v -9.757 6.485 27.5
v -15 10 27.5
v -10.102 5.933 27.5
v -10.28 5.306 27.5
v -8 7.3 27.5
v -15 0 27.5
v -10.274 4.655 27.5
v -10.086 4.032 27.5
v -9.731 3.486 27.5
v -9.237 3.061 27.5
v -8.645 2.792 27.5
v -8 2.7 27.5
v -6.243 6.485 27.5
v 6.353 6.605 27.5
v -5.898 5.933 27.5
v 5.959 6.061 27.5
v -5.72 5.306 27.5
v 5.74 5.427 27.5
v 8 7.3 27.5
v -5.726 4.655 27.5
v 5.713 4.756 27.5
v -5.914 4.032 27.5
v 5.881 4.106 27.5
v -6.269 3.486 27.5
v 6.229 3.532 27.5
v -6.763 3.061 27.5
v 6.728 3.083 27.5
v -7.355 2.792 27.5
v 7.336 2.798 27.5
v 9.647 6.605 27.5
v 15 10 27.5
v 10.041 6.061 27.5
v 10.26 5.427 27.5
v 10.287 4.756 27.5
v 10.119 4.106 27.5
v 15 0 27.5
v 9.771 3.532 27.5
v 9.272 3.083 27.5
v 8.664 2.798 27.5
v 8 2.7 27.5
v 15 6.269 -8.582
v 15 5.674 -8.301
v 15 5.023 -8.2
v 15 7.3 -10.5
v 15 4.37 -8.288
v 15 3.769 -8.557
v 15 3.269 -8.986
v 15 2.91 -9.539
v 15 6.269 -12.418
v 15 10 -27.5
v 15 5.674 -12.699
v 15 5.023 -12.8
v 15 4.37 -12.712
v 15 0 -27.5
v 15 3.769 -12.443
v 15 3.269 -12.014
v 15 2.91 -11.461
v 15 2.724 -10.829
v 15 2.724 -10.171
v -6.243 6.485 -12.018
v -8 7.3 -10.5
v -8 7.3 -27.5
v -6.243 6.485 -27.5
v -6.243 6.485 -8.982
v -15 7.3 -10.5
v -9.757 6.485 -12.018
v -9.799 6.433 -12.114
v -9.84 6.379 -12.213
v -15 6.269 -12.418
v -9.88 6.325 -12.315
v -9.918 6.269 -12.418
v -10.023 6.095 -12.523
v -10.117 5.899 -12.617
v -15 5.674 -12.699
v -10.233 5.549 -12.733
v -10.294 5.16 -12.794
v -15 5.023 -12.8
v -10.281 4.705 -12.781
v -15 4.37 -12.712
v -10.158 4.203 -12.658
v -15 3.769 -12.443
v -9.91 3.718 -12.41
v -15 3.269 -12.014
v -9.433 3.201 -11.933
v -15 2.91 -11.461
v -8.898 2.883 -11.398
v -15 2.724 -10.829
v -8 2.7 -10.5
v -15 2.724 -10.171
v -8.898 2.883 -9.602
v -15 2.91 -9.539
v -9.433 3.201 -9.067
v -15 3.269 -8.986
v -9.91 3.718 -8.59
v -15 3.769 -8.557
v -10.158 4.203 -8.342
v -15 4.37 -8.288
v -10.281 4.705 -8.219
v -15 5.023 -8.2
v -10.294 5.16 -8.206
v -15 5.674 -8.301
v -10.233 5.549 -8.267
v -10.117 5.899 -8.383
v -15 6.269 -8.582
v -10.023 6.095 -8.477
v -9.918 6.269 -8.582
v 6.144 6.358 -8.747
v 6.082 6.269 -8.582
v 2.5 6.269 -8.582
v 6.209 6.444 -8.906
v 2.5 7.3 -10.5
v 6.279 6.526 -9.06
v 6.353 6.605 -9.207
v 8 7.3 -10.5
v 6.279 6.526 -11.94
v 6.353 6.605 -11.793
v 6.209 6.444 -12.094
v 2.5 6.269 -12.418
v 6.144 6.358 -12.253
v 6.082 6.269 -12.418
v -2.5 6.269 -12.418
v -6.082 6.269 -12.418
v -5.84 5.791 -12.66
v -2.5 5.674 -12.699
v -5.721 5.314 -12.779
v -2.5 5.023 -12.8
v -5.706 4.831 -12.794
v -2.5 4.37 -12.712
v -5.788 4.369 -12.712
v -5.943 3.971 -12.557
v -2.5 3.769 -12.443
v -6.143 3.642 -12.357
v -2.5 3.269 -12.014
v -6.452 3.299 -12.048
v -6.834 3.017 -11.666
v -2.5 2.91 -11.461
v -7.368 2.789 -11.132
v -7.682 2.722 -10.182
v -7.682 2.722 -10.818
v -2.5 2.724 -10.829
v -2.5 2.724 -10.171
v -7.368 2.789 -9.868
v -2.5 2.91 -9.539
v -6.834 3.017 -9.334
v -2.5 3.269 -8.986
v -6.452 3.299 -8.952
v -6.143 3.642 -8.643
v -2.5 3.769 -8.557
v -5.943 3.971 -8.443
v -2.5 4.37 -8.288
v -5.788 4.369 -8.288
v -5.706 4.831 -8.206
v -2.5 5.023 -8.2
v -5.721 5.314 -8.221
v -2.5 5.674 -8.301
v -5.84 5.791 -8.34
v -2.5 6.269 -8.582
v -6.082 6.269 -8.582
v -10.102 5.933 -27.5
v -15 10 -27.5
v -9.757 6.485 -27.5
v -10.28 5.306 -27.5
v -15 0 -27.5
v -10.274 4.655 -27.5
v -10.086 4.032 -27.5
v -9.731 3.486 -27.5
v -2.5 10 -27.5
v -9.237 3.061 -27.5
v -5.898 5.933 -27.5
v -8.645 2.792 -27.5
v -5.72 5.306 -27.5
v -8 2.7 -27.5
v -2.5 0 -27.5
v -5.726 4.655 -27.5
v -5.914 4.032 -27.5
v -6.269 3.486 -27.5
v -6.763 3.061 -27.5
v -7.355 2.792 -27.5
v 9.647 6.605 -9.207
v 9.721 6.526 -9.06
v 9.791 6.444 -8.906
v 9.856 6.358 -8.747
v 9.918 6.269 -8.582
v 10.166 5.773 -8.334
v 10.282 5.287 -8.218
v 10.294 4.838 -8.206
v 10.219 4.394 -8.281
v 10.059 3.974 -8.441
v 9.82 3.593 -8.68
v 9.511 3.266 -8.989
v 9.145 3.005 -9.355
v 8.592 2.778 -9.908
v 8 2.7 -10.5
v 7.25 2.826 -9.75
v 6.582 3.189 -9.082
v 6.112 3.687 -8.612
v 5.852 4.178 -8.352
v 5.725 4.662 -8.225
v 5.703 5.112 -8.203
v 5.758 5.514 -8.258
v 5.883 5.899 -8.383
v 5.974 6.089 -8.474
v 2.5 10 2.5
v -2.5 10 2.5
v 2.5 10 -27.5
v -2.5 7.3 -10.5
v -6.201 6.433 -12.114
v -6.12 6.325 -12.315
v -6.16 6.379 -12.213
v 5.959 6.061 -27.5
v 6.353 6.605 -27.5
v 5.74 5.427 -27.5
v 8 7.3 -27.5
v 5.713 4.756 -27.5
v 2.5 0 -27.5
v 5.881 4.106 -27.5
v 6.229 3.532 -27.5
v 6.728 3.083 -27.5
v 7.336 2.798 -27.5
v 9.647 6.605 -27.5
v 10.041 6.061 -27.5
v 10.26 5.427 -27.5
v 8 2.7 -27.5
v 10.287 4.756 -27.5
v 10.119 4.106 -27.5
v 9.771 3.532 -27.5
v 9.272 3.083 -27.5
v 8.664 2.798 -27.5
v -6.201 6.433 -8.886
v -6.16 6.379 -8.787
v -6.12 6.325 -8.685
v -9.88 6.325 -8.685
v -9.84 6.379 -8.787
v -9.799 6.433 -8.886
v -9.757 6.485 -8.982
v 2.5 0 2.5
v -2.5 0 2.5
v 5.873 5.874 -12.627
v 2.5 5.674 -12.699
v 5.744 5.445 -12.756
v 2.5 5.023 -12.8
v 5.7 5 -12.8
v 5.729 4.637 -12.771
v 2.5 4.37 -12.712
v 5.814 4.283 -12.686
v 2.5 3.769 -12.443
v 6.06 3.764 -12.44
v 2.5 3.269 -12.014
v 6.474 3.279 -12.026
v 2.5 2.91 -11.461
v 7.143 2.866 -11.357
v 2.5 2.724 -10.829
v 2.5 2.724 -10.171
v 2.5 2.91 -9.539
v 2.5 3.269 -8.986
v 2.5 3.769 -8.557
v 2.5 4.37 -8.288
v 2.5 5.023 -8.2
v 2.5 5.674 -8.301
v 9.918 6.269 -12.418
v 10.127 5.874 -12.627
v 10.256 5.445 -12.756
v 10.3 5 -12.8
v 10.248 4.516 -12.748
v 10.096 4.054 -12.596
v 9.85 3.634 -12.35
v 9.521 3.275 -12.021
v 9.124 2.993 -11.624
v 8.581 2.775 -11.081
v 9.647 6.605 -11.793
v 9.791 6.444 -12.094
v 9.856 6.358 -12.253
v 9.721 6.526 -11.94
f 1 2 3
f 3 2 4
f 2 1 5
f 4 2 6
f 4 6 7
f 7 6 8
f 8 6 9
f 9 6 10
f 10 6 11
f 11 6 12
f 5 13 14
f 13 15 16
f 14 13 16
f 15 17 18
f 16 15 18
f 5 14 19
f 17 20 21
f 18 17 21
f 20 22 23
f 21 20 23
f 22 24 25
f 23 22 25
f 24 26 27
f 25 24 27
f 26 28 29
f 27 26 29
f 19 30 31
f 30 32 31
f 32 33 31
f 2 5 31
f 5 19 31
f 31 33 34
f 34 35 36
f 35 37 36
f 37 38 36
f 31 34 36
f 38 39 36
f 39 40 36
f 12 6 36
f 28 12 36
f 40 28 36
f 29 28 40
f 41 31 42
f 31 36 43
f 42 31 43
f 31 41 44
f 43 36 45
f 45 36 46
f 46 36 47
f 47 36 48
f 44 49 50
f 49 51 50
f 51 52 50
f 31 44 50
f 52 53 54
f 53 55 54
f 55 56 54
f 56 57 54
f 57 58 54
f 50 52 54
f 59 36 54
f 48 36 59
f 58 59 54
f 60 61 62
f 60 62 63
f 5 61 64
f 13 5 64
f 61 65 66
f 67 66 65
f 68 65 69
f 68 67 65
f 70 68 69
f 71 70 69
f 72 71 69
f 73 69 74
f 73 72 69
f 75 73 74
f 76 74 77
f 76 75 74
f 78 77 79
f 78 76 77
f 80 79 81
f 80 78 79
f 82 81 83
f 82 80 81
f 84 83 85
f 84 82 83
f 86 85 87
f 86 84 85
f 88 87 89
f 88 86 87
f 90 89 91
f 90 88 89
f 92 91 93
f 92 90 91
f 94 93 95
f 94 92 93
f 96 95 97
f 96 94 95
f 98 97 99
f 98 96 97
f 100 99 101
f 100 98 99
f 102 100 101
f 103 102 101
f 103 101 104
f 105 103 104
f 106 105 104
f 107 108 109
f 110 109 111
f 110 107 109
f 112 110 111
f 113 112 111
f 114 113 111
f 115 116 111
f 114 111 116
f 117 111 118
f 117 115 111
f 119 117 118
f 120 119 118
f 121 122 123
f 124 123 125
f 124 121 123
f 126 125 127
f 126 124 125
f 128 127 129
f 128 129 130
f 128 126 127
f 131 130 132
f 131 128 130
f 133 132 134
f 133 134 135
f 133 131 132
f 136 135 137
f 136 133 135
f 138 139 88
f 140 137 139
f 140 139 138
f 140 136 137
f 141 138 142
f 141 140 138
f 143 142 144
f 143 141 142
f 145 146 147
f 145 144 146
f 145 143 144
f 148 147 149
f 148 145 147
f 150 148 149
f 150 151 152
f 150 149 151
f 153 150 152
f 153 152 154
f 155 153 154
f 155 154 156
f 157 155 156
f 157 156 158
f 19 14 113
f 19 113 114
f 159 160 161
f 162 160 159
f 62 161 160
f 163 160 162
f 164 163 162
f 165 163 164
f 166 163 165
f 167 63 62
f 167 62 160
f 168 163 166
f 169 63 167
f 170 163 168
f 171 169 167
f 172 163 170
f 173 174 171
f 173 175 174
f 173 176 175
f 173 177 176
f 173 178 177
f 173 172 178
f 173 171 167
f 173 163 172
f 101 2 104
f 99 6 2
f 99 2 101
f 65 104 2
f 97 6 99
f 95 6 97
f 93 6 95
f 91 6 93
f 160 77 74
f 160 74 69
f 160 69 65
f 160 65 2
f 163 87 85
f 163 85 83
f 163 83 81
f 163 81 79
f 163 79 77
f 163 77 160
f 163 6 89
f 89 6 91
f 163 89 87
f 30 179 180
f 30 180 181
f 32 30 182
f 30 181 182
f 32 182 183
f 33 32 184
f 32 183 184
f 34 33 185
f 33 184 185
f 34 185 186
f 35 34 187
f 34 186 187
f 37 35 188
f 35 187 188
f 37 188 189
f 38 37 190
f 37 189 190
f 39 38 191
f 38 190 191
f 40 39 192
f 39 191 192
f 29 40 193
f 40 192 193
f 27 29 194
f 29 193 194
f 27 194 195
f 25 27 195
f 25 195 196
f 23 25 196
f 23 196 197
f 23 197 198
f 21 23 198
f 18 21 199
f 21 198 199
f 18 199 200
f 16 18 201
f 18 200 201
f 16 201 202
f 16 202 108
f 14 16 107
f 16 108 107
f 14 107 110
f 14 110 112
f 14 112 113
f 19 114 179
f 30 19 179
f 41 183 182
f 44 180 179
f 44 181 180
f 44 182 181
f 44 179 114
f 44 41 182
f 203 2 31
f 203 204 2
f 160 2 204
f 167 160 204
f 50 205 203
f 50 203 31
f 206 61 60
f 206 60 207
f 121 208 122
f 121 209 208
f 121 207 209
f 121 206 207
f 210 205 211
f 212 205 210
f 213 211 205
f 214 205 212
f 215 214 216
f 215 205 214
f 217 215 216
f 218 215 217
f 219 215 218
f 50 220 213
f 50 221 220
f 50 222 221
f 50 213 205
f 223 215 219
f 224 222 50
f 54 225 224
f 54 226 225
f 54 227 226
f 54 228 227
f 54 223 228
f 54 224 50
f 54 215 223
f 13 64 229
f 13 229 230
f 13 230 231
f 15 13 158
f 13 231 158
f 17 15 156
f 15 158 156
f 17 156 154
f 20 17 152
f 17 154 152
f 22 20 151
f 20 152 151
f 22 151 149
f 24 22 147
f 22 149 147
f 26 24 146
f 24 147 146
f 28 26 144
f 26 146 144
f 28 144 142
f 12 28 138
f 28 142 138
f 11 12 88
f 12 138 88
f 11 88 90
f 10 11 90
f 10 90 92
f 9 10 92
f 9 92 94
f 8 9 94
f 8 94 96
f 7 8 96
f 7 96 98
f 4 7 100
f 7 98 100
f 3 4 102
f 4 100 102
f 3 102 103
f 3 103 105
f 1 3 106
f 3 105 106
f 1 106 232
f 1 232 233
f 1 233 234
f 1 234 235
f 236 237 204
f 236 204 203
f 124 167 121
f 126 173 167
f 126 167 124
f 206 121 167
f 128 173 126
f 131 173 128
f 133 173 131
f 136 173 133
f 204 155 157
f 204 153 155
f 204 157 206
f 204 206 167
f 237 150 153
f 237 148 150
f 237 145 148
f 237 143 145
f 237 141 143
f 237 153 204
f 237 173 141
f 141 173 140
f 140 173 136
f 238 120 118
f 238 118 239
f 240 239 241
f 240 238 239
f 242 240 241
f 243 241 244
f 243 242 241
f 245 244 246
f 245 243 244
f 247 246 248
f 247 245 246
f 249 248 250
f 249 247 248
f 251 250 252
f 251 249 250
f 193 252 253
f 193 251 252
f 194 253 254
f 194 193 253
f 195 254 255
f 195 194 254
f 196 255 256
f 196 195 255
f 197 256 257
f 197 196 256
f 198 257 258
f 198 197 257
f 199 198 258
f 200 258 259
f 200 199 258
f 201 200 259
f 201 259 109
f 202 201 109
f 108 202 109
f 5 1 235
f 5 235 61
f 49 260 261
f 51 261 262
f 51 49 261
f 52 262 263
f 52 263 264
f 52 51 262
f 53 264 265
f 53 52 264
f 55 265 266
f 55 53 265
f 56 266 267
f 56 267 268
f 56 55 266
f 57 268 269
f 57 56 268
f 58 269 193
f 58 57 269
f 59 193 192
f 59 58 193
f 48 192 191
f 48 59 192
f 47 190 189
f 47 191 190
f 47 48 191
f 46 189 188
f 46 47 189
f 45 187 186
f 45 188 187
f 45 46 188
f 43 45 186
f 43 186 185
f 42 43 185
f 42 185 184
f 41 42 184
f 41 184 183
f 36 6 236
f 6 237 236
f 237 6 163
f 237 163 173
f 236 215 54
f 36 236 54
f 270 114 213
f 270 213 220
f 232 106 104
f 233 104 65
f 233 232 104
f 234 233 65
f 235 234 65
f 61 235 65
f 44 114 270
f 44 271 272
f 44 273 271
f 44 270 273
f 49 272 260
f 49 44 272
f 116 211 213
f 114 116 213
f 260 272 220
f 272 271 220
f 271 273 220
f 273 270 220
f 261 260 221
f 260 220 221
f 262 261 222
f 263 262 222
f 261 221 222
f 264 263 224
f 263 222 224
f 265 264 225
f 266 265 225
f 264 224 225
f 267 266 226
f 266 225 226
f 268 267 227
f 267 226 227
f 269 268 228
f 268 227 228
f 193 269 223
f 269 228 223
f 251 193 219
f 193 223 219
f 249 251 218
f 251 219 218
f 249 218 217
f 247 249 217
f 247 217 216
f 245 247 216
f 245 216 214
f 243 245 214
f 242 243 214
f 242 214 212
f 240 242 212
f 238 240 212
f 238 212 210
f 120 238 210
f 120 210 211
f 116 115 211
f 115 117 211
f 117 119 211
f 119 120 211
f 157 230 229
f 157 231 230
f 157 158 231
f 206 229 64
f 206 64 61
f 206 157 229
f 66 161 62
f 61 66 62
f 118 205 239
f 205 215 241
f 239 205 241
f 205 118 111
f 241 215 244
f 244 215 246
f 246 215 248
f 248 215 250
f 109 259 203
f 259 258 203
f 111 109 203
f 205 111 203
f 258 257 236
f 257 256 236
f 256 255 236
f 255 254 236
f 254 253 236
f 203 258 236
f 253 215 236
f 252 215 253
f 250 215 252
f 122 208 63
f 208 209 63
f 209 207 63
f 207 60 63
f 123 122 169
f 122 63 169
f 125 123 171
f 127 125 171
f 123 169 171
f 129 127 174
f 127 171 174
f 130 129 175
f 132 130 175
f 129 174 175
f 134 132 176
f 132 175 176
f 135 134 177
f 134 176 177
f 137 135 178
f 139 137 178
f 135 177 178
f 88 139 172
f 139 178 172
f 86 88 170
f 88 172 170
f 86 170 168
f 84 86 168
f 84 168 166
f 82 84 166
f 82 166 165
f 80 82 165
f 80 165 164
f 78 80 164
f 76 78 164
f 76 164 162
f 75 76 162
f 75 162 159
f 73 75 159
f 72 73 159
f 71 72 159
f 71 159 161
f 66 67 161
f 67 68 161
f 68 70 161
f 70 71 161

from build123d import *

# Parameters (mm, degrees)
SKETCH1_W           = 30
SKETCH1_H           = 55
BOSS_EXTRUDE1_DEPTH = 10
CUT_EXTRUDE1_DEPTH  = 58.879184514
CUT_EXTRUDE3_DEPTH  = 42.907636536
SKETCH9_W           = 5
SKETCH9_H           = 30
CUT_EXTRUDE4_DEPTH  = 10


with BuildPart() as part:
    # Sketch1 → Boss-Extrude1 (new body)
    with BuildSketch(Plane(origin=(0, 0, 0), x_dir=(1, 0, 0), z_dir=(0, 1, 0))):
        Rectangle(SKETCH1_W, SKETCH1_H)
    extrude(amount=BOSS_EXTRUDE1_DEPTH)

    # Sketch6 → Cut-Extrude1 (cut, through all)
    with BuildSketch(Plane(origin=(0, 0, -27.5), x_dir=(-1, 0, 0), z_dir=(0, 0, -1))):
        with BuildLine():
            Line((-8, 7.3), (-9.647377045, 6.605038589))
            ThreePointArc((-9.647377045, 6.605038589), (-8, 2.7), (-6.352622955, 6.605038589))
            Line((-6.352622955, 6.605038589), (-8, 7.3))
        make_face()
        with BuildLine():
            Line((8, 7.3), (6.243284106, 6.484570399))
            ThreePointArc((6.243284106, 6.484570399), (8, 2.7), (9.756715894, 6.484570399))
            Line((9.756715894, 6.484570399), (8, 7.3))
        make_face()
    extrude(amount=-CUT_EXTRUDE1_DEPTH, mode=Mode.SUBTRACT)

    # Sketch8 → Cut-Extrude3 (cut, through all)
    with BuildSketch(Plane(origin=(15, 0, 0), x_dir=(0, 0, -1), z_dir=(1, 0, 0))):
        with BuildLine():
            Line((10.5, 7.3), (12.417920009, 6.269481327))
            ThreePointArc((12.417920009, 6.269481327), (10.5, 2.7), (8.582079991, 6.269481327))
            Line((8.582079991, 6.269481327), (10.5, 7.3))
        make_face()
    extrude(amount=-CUT_EXTRUDE3_DEPTH, mode=Mode.SUBTRACT)

    # Sketch9 → Cut-Extrude4 (cut)
    with BuildSketch(Plane.XZ):
        with Locations((0, -12.5)):
            Rectangle(SKETCH9_W, SKETCH9_H)
    extrude(amount=-CUT_EXTRUDE4_DEPTH, mode=Mode.SUBTRACT)


solid = part.part
